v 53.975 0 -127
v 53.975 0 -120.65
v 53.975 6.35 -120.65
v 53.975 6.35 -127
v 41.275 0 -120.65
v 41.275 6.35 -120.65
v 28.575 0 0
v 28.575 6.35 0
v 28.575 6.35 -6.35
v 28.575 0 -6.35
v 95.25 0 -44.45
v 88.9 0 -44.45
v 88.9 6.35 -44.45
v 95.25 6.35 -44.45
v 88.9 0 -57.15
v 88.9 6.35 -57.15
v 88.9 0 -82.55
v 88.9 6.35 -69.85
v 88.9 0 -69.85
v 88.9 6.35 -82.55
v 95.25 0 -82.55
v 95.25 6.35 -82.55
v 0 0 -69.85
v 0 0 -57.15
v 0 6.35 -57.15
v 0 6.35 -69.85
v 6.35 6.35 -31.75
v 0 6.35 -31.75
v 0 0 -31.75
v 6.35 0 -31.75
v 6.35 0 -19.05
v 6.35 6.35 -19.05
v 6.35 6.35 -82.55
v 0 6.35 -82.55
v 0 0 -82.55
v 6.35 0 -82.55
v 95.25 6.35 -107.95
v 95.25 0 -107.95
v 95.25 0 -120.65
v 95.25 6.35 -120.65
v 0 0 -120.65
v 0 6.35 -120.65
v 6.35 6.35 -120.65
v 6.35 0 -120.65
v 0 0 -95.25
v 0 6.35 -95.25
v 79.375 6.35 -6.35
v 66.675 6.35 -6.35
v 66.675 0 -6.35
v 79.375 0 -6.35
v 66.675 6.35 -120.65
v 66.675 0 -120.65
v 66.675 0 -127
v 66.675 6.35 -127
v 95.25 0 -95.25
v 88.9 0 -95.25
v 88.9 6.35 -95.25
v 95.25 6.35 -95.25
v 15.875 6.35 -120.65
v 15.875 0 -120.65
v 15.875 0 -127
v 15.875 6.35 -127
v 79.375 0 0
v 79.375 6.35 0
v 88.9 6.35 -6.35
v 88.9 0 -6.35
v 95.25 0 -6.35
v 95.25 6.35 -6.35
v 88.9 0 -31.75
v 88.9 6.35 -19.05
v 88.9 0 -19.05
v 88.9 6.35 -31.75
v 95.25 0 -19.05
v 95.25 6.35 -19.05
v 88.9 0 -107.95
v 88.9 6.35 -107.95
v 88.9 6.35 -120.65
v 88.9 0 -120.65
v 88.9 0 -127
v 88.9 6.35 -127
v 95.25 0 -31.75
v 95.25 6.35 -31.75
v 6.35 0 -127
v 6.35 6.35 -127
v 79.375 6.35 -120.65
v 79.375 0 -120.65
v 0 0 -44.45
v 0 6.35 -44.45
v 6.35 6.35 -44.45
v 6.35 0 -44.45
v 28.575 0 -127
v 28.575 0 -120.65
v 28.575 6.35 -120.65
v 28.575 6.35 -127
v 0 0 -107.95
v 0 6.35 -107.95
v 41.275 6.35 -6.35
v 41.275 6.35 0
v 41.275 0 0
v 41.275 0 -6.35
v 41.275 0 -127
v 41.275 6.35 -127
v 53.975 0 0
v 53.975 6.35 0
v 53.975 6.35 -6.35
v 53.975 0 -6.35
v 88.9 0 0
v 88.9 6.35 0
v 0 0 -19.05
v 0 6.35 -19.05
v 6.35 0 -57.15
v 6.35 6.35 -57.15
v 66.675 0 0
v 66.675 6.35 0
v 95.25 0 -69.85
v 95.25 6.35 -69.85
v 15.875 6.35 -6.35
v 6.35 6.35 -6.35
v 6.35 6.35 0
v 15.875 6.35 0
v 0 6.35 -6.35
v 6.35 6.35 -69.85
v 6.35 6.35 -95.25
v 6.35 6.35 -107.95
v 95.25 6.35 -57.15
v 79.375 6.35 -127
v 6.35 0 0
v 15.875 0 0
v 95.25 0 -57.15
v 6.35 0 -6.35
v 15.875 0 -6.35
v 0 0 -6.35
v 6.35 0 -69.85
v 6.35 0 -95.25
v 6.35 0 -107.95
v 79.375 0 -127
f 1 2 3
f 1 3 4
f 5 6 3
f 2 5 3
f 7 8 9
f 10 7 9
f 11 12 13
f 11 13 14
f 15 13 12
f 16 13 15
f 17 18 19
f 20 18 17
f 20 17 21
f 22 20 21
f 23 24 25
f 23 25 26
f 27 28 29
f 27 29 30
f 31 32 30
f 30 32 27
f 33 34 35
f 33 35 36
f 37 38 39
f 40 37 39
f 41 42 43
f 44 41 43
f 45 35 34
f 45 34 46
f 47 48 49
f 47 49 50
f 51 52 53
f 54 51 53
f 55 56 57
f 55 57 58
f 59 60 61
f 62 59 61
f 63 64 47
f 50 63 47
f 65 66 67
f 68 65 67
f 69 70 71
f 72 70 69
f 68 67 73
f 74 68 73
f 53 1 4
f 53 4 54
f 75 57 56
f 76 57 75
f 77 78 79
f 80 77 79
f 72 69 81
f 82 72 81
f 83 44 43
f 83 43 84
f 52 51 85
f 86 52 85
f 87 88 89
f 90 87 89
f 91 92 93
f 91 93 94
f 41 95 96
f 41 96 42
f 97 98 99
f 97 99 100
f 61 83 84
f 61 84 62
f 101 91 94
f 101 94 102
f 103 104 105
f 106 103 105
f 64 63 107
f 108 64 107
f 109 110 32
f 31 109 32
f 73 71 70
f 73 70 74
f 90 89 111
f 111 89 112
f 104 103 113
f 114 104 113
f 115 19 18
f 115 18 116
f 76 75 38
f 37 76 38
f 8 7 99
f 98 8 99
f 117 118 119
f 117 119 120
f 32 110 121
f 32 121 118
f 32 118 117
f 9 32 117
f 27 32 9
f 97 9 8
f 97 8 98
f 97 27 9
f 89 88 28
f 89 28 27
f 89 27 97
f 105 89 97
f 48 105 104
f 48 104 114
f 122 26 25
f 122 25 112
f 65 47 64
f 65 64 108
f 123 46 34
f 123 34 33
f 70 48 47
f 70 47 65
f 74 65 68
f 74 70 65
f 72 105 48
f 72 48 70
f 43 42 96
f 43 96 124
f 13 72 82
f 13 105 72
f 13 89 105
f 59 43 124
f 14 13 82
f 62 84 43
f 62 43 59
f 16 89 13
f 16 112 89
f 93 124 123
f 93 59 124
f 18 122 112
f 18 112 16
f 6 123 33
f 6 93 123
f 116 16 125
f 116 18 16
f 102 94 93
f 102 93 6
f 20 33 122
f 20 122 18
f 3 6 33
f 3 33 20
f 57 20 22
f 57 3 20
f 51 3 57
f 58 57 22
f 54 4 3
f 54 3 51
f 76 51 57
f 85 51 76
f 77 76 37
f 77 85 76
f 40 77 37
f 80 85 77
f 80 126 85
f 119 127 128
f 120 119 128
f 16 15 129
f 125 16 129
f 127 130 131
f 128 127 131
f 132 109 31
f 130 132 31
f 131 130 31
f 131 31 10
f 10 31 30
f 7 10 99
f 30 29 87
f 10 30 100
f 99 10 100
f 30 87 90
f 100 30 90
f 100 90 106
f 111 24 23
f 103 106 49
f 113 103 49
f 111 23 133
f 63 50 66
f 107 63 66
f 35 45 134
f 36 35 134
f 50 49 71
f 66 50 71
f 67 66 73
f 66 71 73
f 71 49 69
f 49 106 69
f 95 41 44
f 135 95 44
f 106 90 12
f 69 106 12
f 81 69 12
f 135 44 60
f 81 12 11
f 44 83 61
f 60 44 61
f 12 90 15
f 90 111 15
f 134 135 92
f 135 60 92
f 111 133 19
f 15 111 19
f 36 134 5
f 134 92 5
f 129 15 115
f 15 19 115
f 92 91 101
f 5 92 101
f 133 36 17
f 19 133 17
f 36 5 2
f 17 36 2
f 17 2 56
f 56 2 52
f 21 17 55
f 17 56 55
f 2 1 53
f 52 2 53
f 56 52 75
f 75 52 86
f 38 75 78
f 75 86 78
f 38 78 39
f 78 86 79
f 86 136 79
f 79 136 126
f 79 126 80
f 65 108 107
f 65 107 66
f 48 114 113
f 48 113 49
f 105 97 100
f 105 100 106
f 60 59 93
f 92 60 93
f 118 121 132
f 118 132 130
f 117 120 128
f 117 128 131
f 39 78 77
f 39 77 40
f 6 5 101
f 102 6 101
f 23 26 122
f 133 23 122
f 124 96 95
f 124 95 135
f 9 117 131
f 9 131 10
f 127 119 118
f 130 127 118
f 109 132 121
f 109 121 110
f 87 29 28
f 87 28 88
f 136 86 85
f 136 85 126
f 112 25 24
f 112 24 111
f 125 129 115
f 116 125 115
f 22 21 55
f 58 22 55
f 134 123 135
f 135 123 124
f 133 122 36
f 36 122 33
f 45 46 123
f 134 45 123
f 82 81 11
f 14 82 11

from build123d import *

# Parameters (mm, degrees)
SKETCH1_W           = 95.25
SKETCH1_H           = 127
BOSS_EXTRUDE1_DEPTH = 6.35
SKETCH2_W           = 6.35
SKETCH2_H           = 12.7
SKETCH2_H_2         = 6.35
CUT_EXTRUDE1_DEPTH  = 7.35
LPATTERN1_COUNT     = 5
LPATTERN1_PITCH     = 25.4
SKETCH4_W           = 12.7
SKETCH4_H           = 6.35
CUT_EXTRUDE3_DEPTH  = 7.35
LPATTERN2_COUNT     = 2
LPATTERN2_PITCH     = 25.4
LPATTERN2_COL_COUNT = 2
LPATTERN2_COL_PITCH = 25.4


with BuildPart() as part:
    # Sketch1 → Boss-Extrude1 (new body)
    with BuildSketch(Plane(origin=(0, 0, 0), x_dir=(1, 0, 0), z_dir=(0, 1, 0))):
        with Locations((47.625, 63.5)):
            Rectangle(SKETCH1_W, SKETCH1_H)
    extrude(amount=BOSS_EXTRUDE1_DEPTH)

    # Sketch2 → Cut-Extrude1 (cut, through all)
    with BuildSketch(Plane(origin=(0, 6.35, 0), x_dir=(1, 0, 0), z_dir=(0, 1, 0))):
        with Locations((3.175, 127)):
            Rectangle(SKETCH2_W, SKETCH2_H)
        with Locations((92.075, 127)):
            Rectangle(SKETCH2_W, SKETCH2_H)
        with Locations((3.175, 3.175)):
            Rectangle(SKETCH2_W, SKETCH2_H_2)
        with Locations((92.075, 3.175)):
            Rectangle(SKETCH2_W, SKETCH2_H_2)
    cut_extrude1 = extrude(amount=-CUT_EXTRUDE1_DEPTH, mode=Mode.SUBTRACT)

    # LPattern1: Cut-Extrude1 ×5
    with Locations(*[(0, 0, i * LPATTERN1_PITCH) for i in range(1, LPATTERN1_COUNT)]):
        add(cut_extrude1, mode=Mode.SUBTRACT)

    # Sketch4 → Cut-Extrude3 (cut, through all)
    with BuildSketch(Plane(origin=(0, 6.35, 0), x_dir=(1, 0, 0), z_dir=(0, 1, 0))):
        with Locations((47.625, 123.825)):
            Rectangle(SKETCH4_W, SKETCH4_H)
        with Locations((47.625, 3.175)):
            Rectangle(SKETCH4_W, SKETCH4_H)
    cut_extrude3 = extrude(amount=-CUT_EXTRUDE3_DEPTH, mode=Mode.SUBTRACT)

    # LPattern2: Cut-Extrude3 ×2
    with Locations(*[(-i * LPATTERN2_PITCH, 0, 0) for i in range(1, LPATTERN2_COUNT)]):
        add(cut_extrude3, mode=Mode.SUBTRACT)

    # LPattern2 col: Cut-Extrude3 ×2
    with Locations(*[(i * LPATTERN2_COL_PITCH, 0, 0) for i in range(1, LPATTERN2_COL_COUNT)]):
        add(cut_extrude3, mode=Mode.SUBTRACT)


solid = part.part
